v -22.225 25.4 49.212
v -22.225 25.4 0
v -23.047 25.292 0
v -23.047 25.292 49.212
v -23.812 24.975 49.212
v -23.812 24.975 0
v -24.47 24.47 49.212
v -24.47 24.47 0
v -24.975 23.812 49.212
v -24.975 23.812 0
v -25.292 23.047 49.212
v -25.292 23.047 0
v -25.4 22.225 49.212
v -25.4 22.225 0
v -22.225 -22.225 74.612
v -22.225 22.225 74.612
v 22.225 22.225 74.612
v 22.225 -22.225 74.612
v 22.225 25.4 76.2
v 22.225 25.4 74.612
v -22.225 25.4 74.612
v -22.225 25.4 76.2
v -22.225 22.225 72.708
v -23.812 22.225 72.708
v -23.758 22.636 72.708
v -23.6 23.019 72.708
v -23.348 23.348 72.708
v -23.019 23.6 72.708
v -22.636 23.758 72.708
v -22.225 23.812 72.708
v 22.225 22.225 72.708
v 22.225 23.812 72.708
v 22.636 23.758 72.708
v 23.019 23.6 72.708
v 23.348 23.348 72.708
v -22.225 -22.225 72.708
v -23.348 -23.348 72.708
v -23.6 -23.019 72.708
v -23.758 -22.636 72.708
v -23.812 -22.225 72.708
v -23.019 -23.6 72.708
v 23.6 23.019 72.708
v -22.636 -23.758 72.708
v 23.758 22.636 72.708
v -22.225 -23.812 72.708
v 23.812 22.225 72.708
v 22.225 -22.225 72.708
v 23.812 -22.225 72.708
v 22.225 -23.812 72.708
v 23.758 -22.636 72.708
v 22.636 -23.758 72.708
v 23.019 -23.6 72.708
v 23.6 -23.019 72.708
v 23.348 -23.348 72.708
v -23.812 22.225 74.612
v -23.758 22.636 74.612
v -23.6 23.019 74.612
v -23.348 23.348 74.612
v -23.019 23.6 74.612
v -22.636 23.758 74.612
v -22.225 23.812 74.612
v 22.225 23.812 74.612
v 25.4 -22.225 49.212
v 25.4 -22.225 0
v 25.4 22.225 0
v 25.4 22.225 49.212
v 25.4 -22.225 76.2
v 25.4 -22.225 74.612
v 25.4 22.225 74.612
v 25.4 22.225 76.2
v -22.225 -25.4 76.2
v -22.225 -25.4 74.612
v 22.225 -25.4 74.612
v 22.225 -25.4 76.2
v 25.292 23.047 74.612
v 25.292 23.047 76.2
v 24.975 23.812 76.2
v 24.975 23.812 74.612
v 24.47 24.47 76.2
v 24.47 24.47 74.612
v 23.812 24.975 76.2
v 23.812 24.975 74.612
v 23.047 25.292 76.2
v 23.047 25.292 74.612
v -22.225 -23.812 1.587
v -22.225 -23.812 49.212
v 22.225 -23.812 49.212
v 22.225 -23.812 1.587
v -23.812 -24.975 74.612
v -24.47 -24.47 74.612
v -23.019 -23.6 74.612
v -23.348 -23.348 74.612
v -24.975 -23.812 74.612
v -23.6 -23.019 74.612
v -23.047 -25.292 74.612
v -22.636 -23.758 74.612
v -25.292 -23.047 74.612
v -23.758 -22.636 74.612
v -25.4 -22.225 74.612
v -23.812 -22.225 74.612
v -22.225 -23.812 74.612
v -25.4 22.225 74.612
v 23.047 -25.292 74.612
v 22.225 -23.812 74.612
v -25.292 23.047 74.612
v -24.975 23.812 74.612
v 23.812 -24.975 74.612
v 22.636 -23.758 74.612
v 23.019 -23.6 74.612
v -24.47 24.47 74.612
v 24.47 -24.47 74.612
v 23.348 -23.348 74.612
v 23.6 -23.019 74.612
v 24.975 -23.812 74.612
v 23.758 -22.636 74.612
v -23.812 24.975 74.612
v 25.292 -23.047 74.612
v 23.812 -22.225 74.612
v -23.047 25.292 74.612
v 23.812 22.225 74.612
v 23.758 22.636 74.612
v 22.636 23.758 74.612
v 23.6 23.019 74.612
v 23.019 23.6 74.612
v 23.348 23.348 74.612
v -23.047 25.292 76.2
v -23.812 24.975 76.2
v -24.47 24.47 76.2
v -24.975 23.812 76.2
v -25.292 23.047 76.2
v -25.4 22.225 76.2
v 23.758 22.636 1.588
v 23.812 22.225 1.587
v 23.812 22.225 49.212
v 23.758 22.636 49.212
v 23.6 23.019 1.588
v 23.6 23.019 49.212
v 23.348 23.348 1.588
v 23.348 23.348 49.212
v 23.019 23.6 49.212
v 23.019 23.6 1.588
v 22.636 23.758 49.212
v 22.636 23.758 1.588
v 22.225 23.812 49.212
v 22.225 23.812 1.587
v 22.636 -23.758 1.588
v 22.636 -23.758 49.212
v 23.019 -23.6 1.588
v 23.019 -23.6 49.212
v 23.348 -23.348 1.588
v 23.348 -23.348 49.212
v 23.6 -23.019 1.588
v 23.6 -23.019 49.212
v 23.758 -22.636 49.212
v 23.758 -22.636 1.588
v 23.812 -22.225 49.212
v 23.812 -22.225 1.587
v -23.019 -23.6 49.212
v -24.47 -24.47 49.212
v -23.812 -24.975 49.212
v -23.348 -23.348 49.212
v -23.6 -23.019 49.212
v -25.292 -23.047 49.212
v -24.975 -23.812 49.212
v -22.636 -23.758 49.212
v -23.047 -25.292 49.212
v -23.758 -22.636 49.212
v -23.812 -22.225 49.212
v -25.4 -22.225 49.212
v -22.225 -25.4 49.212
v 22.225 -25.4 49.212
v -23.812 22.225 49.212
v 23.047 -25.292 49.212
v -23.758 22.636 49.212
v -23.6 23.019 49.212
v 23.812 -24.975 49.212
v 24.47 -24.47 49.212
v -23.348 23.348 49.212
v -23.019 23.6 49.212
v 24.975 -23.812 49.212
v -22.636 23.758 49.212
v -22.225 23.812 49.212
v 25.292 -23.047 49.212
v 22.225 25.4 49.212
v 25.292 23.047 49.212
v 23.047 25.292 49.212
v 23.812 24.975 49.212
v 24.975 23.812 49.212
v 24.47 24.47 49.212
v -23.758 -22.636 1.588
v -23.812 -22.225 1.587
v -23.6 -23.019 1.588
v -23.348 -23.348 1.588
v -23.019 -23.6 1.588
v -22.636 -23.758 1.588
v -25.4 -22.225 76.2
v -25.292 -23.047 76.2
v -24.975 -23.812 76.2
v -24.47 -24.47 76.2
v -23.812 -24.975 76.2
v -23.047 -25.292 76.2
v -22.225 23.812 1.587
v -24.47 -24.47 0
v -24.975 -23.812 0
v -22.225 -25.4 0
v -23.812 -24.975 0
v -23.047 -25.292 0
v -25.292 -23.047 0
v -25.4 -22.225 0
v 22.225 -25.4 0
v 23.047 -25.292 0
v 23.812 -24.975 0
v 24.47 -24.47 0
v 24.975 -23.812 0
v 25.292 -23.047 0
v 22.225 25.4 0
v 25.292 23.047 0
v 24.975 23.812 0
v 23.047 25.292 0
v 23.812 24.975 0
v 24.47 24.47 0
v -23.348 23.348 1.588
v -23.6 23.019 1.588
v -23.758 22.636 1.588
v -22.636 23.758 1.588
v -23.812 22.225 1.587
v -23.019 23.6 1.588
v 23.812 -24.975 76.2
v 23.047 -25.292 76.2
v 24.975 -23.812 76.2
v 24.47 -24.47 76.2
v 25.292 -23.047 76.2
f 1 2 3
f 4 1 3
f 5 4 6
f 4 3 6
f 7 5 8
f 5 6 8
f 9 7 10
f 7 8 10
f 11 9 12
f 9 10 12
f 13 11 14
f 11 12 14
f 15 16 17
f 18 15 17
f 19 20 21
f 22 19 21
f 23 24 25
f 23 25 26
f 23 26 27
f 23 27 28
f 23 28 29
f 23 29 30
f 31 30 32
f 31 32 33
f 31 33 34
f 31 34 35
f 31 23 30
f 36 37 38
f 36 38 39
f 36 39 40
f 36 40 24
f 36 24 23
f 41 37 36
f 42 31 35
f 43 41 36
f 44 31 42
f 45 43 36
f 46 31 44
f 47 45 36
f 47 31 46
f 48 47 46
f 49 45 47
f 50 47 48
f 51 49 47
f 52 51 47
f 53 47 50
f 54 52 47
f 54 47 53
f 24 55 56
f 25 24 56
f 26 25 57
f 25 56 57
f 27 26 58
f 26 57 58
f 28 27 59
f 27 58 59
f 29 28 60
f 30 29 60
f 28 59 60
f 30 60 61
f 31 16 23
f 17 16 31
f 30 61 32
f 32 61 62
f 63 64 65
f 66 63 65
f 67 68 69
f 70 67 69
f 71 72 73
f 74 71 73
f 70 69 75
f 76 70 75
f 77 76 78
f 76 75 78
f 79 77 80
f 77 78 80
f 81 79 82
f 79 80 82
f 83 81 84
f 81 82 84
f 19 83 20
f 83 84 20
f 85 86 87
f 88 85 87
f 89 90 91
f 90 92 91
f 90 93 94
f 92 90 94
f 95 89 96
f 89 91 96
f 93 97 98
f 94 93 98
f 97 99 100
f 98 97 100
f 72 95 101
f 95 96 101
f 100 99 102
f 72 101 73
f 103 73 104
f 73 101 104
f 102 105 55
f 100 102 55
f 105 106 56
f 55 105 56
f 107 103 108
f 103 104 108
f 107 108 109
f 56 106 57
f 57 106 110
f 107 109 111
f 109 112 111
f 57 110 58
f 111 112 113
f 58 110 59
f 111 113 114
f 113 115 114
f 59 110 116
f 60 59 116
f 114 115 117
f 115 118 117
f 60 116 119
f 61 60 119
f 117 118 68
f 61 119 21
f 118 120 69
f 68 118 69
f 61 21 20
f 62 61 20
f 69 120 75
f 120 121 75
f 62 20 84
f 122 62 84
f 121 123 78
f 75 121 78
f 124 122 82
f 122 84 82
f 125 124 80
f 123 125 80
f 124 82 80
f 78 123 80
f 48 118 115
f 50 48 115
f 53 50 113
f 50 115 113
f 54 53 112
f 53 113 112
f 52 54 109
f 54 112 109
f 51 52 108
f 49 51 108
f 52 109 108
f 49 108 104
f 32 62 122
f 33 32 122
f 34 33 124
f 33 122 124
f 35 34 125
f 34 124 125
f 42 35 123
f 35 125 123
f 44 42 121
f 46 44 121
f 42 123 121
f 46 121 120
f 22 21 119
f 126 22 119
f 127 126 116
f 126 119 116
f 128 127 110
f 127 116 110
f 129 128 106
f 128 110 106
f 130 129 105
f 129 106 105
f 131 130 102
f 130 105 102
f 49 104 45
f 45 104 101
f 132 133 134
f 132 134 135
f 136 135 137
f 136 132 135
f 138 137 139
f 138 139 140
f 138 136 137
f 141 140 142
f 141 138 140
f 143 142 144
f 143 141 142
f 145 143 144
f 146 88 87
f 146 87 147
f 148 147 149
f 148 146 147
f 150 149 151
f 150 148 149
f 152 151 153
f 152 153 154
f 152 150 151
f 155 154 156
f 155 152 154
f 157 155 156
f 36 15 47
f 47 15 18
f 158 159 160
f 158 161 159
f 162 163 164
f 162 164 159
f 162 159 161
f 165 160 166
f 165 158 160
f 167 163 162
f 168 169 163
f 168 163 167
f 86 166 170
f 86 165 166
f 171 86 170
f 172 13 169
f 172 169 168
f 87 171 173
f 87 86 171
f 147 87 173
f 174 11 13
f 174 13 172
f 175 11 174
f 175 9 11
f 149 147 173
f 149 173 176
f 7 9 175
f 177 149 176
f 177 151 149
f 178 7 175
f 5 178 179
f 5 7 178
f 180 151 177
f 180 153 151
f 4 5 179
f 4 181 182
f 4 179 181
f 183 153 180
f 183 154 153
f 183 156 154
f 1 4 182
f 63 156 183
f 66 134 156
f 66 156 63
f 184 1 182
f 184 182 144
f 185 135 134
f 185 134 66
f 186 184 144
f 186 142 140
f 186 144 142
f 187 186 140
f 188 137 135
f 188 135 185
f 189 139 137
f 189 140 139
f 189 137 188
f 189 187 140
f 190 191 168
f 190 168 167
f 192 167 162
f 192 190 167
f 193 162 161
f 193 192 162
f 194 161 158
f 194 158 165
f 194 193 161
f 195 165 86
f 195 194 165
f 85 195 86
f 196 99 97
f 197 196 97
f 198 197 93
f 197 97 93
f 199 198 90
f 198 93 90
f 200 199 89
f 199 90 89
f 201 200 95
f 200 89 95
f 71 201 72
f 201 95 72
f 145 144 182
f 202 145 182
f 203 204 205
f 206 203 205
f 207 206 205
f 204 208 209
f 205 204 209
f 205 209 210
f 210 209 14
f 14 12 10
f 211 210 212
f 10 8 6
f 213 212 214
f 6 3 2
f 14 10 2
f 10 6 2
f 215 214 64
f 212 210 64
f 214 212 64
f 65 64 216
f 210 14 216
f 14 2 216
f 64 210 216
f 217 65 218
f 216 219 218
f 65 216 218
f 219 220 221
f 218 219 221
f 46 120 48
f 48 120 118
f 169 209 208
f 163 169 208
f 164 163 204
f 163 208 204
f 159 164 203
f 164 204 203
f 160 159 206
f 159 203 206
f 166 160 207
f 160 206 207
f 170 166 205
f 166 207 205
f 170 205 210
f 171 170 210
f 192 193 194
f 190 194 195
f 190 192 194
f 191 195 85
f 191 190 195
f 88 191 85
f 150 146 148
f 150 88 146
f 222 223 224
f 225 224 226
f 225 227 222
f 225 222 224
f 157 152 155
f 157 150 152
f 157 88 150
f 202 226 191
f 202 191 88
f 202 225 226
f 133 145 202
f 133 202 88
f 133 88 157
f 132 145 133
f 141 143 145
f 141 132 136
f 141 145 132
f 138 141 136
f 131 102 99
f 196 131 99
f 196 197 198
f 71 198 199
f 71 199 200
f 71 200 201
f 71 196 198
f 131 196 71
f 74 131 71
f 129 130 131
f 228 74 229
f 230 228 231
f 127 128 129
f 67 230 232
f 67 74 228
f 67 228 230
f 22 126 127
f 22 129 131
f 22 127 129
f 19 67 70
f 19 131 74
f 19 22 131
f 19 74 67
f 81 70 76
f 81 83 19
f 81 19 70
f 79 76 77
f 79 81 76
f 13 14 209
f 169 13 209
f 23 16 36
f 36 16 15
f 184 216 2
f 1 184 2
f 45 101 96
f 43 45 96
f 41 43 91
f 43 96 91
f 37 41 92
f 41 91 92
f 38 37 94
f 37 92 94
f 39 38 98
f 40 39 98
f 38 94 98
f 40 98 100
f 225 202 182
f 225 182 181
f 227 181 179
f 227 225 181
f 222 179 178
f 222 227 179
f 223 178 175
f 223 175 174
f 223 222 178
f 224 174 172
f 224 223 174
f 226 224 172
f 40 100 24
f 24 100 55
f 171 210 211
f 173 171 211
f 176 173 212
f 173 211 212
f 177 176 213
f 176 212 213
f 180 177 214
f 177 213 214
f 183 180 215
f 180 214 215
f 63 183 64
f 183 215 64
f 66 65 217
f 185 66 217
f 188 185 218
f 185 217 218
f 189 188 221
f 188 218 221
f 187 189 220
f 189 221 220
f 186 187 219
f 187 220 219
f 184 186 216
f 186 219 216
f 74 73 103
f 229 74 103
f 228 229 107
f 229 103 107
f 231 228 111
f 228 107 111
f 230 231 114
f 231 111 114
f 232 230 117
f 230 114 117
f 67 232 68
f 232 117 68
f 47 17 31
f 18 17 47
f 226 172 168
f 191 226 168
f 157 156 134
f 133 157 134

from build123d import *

# Parameters (mm, degrees)
F1_DEPTH = 49.2125
F2_T     = -1.5875
F5_DEPTH = 1.5875
F6_W     = 44.45
F6_H     = 44.45
F7_DEPTH = 1.905


with BuildPart() as f1:
    # F0 (on Top) → F1 (new body)
    with BuildSketch(Plane.XY):
        with BuildLine():
            ThreePointArc((25.4, 22.225), (24.470064, 24.470064), (22.225, 25.4))
            Line((22.225, 25.4), (-22.225, 25.4))
            ThreePointArc((-22.225, 25.4), (-24.470064, 24.470064), (-25.4, 22.225))
            Line((-25.4, 22.225), (-25.4, -22.225))
            ThreePointArc((-25.4, -22.225), (-24.470064, -24.470064), (-22.225, -25.4))
            Line((-22.225, -25.4), (22.225, -25.4))
            ThreePointArc((22.225, -25.4), (24.470064, -24.470064), (25.4, -22.225))
            Line((25.4, -22.225), (25.4, 22.225))
        make_face()
    extrude(amount=F1_DEPTH)

    # F2
    f2_openings = [f1.faces().sort_by_distance(p)[0] for p in [
        (0, 0, 49.2125),
    ]]
    offset(amount=F2_T, openings=f2_openings)


with BuildPart() as f5:
    # F4 (on offset) → F5 (new body)
    with BuildSketch(Plane.XY.offset(74.6125)):
        with BuildLine():
            ThreePointArc((-22.225, 25.4), (-24.470064, 24.470064), (-25.4, 22.225))
            Line((-25.4, 22.225), (-25.4, -22.225))
            ThreePointArc((-25.4, -22.225), (-24.470064, -24.470064), (-22.225, -25.4))
            Line((-22.225, -25.4), (22.225, -25.4))
            ThreePointArc((22.225, -25.4), (24.470064, -24.470064), (25.4, -22.225))
            Line((25.4, -22.225), (25.4, 22.225))
            ThreePointArc((25.4, 22.225), (24.470064, 24.470064), (22.225, 25.4))
            Line((22.225, 25.4), (-22.225, 25.4))
        make_face()
    extrude(amount=F5_DEPTH)

    # F6 (on face) → F7 (join)
    with BuildSketch(Plane(origin=(0, 0, 74.6125), x_dir=(1, 0, 0), z_dir=(0, 0, -1))):
        with BuildLine():
            ThreePointArc((23.8125, 22.225), (23.347532, 23.347532), (22.225, 23.8125))
            Line((22.225, 23.8125), (-22.225, 23.8125))
            ThreePointArc((-22.225, 23.8125), (-23.347532, 23.347532), (-23.8125, 22.225))
            Line((-23.8125, 22.225), (-23.8125, -22.225))
            ThreePointArc((-23.8125, -22.225), (-23.347532, -23.347532), (-22.225, -23.8125))
            Line((-22.225, -23.8125), (22.225, -23.8125))
            ThreePointArc((22.225, -23.8125), (23.347532, -23.347532), (23.8125, -22.225))
            Line((23.8125, -22.225), (23.8125, 22.225))
        make_face()
        Rectangle(F6_W, F6_H, mode=Mode.SUBTRACT)
    extrude(amount=F7_DEPTH)


solid = Compound([f1.part, f5.part])
